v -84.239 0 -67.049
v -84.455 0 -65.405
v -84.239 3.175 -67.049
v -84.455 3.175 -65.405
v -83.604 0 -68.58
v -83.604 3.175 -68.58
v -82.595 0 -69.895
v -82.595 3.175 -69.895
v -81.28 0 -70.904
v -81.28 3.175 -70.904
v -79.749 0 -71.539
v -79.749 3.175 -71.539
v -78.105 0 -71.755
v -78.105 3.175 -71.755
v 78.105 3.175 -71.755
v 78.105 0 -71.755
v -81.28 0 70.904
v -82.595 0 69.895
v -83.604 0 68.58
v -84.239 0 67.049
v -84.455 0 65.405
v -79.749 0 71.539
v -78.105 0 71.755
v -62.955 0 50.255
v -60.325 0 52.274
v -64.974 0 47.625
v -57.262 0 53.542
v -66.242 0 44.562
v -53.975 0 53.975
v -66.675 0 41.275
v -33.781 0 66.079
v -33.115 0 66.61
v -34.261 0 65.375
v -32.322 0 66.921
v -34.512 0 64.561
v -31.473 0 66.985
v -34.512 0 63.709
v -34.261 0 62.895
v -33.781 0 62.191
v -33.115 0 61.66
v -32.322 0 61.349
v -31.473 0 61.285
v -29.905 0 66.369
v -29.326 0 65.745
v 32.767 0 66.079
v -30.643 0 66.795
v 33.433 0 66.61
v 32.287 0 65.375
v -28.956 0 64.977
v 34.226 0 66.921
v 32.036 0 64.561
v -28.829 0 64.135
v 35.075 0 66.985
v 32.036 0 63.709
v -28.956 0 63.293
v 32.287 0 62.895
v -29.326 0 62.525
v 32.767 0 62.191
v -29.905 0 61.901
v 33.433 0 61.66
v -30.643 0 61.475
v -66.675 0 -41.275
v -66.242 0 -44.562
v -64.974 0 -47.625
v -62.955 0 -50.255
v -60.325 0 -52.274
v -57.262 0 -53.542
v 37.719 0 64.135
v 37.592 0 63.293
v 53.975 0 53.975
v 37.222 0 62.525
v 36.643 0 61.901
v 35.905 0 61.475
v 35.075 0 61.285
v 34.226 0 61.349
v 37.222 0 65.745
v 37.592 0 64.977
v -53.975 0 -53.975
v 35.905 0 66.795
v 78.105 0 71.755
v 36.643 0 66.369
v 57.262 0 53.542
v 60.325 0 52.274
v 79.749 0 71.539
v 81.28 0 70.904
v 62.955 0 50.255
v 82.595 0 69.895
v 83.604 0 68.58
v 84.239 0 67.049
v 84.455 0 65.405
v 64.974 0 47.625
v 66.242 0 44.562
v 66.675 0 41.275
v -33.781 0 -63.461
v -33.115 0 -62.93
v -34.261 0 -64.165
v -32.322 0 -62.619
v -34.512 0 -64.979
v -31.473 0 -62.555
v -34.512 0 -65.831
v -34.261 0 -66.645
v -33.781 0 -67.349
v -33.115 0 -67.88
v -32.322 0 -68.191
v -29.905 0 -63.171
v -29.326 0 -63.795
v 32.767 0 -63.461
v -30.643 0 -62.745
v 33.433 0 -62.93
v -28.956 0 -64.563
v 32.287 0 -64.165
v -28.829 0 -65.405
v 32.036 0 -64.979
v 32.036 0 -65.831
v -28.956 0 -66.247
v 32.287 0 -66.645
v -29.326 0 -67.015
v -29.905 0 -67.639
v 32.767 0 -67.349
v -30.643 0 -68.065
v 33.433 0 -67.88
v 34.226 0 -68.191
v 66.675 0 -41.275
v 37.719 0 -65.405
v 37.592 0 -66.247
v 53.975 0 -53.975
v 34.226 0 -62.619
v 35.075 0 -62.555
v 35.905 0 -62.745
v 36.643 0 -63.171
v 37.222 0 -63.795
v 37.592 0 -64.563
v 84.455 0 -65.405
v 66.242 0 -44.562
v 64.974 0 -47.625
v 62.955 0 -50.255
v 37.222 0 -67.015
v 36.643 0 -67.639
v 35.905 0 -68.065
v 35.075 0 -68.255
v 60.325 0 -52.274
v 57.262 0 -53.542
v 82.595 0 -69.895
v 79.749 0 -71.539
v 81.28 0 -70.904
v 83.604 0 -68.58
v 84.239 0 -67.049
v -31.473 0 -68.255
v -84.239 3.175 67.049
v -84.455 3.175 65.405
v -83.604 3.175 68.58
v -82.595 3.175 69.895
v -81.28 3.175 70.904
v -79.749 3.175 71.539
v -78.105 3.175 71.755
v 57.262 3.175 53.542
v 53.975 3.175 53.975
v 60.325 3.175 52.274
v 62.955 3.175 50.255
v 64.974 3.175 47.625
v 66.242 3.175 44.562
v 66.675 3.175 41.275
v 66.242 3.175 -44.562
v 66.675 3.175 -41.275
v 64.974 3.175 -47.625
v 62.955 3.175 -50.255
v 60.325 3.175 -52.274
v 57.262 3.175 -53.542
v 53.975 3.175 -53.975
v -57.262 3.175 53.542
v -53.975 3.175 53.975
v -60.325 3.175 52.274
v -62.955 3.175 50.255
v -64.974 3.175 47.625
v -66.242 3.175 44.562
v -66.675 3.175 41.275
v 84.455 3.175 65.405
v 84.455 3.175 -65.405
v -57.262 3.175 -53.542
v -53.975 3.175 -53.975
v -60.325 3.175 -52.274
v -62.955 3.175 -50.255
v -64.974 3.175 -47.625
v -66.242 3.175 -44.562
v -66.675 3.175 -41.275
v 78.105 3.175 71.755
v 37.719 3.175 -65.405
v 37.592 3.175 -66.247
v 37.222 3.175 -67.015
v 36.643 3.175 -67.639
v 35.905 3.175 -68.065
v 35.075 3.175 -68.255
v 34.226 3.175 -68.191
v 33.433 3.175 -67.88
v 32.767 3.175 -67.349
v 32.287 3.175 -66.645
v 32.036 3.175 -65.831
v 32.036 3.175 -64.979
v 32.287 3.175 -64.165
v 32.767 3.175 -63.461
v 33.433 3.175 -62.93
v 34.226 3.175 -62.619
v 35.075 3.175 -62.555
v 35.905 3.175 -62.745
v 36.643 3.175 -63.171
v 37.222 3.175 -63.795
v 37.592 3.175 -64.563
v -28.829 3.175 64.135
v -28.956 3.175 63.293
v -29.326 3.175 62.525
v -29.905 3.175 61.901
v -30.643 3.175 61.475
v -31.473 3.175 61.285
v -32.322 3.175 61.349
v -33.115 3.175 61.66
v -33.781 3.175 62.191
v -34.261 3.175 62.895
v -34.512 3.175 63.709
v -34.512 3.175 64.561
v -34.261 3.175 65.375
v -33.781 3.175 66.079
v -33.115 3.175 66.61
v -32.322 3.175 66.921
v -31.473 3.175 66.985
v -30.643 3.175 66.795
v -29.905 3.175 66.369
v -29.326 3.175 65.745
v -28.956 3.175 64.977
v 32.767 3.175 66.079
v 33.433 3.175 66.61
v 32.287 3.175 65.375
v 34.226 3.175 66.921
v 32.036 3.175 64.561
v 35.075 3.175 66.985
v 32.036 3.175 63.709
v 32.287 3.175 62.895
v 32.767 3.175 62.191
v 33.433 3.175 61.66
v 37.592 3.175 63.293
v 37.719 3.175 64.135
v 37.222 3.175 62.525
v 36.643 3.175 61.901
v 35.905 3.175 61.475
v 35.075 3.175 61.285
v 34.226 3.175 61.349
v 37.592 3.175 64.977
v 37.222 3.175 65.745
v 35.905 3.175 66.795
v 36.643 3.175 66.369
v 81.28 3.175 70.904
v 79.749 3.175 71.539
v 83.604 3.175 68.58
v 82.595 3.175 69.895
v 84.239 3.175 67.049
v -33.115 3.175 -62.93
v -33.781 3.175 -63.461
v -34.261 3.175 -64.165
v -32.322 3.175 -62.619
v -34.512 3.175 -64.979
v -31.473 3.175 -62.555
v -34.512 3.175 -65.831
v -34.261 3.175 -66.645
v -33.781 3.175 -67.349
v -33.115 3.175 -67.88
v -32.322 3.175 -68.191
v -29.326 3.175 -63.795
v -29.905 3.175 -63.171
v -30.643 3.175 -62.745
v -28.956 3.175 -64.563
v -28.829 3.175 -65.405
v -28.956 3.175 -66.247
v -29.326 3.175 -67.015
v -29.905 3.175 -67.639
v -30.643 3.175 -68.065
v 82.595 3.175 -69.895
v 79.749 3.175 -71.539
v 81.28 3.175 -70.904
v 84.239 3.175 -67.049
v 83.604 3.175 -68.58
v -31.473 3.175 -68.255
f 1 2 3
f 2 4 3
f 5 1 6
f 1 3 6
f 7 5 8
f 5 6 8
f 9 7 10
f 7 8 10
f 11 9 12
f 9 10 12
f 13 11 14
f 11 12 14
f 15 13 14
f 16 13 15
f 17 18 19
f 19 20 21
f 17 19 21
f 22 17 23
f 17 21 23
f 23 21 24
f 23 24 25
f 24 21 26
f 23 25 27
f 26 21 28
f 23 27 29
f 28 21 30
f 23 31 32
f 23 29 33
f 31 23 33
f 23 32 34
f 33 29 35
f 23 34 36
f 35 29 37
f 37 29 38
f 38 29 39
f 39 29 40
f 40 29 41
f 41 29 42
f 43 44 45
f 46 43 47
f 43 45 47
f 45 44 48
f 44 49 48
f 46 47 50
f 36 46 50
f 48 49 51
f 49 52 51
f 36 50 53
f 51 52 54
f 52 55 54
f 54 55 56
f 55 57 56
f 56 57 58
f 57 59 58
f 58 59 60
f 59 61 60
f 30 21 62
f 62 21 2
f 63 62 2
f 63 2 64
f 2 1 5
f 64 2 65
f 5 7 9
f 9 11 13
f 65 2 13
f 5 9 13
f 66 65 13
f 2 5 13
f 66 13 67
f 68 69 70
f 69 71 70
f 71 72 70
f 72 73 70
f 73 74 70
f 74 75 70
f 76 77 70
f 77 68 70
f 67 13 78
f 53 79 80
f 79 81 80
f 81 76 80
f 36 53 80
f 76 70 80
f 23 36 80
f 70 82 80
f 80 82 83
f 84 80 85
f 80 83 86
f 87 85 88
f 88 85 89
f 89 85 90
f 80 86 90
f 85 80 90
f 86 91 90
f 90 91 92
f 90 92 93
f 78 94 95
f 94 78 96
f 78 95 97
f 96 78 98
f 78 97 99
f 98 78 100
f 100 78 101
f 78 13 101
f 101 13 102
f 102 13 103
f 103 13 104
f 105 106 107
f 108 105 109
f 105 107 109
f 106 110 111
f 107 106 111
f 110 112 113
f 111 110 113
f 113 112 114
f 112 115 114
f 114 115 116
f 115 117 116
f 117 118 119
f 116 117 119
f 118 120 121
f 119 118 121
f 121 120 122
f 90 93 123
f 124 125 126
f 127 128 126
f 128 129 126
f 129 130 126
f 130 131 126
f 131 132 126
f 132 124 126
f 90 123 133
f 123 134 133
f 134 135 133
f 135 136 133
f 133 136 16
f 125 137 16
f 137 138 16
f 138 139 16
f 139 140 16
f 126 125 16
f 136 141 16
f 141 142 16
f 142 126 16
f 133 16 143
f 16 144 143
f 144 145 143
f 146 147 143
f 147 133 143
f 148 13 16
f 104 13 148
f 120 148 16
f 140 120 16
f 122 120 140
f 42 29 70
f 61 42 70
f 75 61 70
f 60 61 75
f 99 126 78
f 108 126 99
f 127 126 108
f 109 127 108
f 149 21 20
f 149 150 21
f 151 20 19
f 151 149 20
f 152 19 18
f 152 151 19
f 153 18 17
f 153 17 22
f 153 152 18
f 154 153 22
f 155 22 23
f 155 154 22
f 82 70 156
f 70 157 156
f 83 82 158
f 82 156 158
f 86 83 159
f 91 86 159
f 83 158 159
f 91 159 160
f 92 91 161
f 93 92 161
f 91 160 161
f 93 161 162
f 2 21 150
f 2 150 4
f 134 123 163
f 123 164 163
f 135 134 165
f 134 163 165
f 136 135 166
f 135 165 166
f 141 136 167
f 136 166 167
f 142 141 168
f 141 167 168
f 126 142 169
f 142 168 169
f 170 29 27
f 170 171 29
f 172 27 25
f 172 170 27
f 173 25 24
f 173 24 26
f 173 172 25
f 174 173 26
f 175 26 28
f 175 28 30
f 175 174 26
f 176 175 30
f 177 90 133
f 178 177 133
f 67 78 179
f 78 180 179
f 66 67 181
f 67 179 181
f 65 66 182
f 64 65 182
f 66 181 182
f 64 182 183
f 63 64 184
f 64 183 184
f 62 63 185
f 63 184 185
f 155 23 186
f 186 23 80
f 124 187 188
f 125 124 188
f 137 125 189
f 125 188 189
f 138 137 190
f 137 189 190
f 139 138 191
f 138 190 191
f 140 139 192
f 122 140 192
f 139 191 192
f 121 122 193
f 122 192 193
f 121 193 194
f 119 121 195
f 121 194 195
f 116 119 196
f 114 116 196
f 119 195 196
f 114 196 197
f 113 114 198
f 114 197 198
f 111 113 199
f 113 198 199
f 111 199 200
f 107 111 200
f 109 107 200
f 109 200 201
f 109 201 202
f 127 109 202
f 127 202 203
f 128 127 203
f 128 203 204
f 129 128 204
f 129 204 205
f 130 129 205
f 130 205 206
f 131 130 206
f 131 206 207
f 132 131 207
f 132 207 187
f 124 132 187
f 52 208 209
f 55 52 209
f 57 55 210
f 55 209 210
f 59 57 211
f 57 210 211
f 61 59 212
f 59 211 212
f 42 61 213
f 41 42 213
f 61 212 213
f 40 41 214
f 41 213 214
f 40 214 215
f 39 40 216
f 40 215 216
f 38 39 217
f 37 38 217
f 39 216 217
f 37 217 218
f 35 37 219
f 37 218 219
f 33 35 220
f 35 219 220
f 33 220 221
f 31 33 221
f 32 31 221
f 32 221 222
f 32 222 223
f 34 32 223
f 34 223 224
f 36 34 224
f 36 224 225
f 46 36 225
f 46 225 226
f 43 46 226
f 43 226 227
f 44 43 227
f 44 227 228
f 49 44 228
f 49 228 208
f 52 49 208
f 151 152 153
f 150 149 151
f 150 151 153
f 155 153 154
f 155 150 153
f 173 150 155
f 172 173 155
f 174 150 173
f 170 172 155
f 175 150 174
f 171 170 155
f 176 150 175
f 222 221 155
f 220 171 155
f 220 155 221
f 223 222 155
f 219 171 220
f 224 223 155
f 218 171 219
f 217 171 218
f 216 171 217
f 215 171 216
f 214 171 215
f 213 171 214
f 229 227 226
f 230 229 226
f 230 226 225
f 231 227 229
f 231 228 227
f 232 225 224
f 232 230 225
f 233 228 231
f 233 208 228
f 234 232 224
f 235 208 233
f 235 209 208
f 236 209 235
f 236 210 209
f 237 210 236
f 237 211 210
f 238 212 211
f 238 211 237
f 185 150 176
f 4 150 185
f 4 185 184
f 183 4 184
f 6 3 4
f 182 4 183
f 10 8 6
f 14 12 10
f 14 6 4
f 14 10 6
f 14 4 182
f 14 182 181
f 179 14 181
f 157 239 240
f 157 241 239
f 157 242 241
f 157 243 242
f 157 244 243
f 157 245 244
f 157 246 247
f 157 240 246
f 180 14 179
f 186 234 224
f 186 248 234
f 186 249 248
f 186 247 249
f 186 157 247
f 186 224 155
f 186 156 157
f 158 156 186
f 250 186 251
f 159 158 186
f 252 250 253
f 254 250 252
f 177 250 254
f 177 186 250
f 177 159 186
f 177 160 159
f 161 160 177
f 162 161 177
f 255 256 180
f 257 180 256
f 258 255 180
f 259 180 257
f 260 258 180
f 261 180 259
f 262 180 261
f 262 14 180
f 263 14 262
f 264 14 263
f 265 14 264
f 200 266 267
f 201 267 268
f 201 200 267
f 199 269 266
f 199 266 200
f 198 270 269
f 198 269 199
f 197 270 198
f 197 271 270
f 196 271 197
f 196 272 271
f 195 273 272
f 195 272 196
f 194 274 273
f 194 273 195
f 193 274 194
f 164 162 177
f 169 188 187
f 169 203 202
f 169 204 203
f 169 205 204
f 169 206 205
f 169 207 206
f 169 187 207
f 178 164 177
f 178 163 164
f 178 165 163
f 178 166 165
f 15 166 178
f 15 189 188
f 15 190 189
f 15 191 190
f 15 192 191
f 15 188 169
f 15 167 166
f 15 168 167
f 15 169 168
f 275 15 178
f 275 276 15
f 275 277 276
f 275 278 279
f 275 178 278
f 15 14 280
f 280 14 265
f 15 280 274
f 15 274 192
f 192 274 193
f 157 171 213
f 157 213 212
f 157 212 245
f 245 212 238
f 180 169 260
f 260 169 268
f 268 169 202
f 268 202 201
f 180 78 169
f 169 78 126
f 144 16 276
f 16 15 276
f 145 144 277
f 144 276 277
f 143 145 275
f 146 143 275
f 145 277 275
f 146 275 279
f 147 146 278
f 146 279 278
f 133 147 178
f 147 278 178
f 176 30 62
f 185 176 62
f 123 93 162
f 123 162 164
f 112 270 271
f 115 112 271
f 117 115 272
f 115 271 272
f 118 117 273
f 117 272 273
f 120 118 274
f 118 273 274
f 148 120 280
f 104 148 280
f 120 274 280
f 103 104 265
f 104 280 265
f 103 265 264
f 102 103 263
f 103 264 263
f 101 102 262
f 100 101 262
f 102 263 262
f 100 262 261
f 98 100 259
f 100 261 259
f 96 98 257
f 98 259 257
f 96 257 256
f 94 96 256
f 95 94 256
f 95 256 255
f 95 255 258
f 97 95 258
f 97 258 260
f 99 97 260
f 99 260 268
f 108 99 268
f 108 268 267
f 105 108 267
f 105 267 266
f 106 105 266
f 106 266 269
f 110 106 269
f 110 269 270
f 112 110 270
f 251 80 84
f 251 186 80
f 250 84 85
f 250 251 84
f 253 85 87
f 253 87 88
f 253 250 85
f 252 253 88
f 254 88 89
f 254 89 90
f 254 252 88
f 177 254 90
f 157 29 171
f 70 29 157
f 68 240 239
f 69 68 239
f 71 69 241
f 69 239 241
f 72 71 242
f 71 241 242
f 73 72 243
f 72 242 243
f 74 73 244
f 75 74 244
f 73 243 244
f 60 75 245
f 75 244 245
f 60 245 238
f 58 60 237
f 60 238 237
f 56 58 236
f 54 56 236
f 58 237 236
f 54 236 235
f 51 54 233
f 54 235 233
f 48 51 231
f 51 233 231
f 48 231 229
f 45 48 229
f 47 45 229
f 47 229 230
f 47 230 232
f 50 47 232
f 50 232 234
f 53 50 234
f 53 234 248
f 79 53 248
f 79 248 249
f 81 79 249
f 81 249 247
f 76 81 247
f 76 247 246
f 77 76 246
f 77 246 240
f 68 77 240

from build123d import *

# Parameters (mm, degrees)
SKETCH1_W            = 168.91
SKETCH1_H            = 143.51
SKETCH1_W_2          = 133.35
SKETCH1_H_2          = 107.95
BOSS_EXTRUDE1_DEPTH  = 3.175
FILLET1_R            = 6.35
FILLET2_R            = 12.7
SKETCH2_R            = 2.8575
CUT_EXTRUDE1_DEPTH   = 4.175
LPATTERN1_COUNT      = 2
LPATTERN1_PITCH      = 66.548
LPATTERN1_COUNT_DIR2 = 2
LPATTERN1_PITCH_DIR2 = 129.54


with BuildPart() as part:
    # Sketch1 → Boss-Extrude1 (new body)
    with BuildSketch(Plane(origin=(0, 0, 0), x_dir=(1, 0, 0), z_dir=(0, 1, 0))):
        Rectangle(SKETCH1_W, SKETCH1_H)
        Rectangle(SKETCH1_W_2, SKETCH1_H_2, mode=Mode.SUBTRACT)
    extrude(amount=BOSS_EXTRUDE1_DEPTH)

    # Fillet1
    fillet1_edges = [part.edges().sort_by_distance(p)[0] for p in [
        (-84.455, 1.5875, 71.755),
        (-84.455, 1.5875, -71.755),
        (84.455, 1.5875, -71.755),
        (84.455, 1.5875, 71.755),
    ]]
    fillet(fillet1_edges, radius=FILLET1_R)

    # Fillet2
    fillet2_edges = [part.edges().sort_by_distance(p)[0] for p in [
        (-66.675, 1.5875, -53.975),
        (-66.675, 1.5875, 53.975),
        (66.675, 1.5875, 53.975),
        (66.675, 1.5875, -53.975),
    ]]
    fillet(fillet2_edges, radius=FILLET2_R)

    # Sketch2 → Cut-Extrude1 (cut, through all)
    with BuildSketch(Plane(origin=(0, 3.175, 0), x_dir=(1, 0, 0), z_dir=(0, 1, 0))):
        with Locations((-31.6865, 65.405)):
            Circle(SKETCH2_R)
    cut_extrude1 = extrude(amount=-CUT_EXTRUDE1_DEPTH, mode=Mode.SUBTRACT)

    # LPattern1: Cut-Extrude1 2 × 2
    with Locations(*[(i * LPATTERN1_PITCH, 0, j * LPATTERN1_PITCH_DIR2) for i in range(LPATTERN1_COUNT) for j in range(LPATTERN1_COUNT_DIR2) if (i, j) != (0, 0)]):
        add(cut_extrude1, mode=Mode.SUBTRACT)


solid = part.part
